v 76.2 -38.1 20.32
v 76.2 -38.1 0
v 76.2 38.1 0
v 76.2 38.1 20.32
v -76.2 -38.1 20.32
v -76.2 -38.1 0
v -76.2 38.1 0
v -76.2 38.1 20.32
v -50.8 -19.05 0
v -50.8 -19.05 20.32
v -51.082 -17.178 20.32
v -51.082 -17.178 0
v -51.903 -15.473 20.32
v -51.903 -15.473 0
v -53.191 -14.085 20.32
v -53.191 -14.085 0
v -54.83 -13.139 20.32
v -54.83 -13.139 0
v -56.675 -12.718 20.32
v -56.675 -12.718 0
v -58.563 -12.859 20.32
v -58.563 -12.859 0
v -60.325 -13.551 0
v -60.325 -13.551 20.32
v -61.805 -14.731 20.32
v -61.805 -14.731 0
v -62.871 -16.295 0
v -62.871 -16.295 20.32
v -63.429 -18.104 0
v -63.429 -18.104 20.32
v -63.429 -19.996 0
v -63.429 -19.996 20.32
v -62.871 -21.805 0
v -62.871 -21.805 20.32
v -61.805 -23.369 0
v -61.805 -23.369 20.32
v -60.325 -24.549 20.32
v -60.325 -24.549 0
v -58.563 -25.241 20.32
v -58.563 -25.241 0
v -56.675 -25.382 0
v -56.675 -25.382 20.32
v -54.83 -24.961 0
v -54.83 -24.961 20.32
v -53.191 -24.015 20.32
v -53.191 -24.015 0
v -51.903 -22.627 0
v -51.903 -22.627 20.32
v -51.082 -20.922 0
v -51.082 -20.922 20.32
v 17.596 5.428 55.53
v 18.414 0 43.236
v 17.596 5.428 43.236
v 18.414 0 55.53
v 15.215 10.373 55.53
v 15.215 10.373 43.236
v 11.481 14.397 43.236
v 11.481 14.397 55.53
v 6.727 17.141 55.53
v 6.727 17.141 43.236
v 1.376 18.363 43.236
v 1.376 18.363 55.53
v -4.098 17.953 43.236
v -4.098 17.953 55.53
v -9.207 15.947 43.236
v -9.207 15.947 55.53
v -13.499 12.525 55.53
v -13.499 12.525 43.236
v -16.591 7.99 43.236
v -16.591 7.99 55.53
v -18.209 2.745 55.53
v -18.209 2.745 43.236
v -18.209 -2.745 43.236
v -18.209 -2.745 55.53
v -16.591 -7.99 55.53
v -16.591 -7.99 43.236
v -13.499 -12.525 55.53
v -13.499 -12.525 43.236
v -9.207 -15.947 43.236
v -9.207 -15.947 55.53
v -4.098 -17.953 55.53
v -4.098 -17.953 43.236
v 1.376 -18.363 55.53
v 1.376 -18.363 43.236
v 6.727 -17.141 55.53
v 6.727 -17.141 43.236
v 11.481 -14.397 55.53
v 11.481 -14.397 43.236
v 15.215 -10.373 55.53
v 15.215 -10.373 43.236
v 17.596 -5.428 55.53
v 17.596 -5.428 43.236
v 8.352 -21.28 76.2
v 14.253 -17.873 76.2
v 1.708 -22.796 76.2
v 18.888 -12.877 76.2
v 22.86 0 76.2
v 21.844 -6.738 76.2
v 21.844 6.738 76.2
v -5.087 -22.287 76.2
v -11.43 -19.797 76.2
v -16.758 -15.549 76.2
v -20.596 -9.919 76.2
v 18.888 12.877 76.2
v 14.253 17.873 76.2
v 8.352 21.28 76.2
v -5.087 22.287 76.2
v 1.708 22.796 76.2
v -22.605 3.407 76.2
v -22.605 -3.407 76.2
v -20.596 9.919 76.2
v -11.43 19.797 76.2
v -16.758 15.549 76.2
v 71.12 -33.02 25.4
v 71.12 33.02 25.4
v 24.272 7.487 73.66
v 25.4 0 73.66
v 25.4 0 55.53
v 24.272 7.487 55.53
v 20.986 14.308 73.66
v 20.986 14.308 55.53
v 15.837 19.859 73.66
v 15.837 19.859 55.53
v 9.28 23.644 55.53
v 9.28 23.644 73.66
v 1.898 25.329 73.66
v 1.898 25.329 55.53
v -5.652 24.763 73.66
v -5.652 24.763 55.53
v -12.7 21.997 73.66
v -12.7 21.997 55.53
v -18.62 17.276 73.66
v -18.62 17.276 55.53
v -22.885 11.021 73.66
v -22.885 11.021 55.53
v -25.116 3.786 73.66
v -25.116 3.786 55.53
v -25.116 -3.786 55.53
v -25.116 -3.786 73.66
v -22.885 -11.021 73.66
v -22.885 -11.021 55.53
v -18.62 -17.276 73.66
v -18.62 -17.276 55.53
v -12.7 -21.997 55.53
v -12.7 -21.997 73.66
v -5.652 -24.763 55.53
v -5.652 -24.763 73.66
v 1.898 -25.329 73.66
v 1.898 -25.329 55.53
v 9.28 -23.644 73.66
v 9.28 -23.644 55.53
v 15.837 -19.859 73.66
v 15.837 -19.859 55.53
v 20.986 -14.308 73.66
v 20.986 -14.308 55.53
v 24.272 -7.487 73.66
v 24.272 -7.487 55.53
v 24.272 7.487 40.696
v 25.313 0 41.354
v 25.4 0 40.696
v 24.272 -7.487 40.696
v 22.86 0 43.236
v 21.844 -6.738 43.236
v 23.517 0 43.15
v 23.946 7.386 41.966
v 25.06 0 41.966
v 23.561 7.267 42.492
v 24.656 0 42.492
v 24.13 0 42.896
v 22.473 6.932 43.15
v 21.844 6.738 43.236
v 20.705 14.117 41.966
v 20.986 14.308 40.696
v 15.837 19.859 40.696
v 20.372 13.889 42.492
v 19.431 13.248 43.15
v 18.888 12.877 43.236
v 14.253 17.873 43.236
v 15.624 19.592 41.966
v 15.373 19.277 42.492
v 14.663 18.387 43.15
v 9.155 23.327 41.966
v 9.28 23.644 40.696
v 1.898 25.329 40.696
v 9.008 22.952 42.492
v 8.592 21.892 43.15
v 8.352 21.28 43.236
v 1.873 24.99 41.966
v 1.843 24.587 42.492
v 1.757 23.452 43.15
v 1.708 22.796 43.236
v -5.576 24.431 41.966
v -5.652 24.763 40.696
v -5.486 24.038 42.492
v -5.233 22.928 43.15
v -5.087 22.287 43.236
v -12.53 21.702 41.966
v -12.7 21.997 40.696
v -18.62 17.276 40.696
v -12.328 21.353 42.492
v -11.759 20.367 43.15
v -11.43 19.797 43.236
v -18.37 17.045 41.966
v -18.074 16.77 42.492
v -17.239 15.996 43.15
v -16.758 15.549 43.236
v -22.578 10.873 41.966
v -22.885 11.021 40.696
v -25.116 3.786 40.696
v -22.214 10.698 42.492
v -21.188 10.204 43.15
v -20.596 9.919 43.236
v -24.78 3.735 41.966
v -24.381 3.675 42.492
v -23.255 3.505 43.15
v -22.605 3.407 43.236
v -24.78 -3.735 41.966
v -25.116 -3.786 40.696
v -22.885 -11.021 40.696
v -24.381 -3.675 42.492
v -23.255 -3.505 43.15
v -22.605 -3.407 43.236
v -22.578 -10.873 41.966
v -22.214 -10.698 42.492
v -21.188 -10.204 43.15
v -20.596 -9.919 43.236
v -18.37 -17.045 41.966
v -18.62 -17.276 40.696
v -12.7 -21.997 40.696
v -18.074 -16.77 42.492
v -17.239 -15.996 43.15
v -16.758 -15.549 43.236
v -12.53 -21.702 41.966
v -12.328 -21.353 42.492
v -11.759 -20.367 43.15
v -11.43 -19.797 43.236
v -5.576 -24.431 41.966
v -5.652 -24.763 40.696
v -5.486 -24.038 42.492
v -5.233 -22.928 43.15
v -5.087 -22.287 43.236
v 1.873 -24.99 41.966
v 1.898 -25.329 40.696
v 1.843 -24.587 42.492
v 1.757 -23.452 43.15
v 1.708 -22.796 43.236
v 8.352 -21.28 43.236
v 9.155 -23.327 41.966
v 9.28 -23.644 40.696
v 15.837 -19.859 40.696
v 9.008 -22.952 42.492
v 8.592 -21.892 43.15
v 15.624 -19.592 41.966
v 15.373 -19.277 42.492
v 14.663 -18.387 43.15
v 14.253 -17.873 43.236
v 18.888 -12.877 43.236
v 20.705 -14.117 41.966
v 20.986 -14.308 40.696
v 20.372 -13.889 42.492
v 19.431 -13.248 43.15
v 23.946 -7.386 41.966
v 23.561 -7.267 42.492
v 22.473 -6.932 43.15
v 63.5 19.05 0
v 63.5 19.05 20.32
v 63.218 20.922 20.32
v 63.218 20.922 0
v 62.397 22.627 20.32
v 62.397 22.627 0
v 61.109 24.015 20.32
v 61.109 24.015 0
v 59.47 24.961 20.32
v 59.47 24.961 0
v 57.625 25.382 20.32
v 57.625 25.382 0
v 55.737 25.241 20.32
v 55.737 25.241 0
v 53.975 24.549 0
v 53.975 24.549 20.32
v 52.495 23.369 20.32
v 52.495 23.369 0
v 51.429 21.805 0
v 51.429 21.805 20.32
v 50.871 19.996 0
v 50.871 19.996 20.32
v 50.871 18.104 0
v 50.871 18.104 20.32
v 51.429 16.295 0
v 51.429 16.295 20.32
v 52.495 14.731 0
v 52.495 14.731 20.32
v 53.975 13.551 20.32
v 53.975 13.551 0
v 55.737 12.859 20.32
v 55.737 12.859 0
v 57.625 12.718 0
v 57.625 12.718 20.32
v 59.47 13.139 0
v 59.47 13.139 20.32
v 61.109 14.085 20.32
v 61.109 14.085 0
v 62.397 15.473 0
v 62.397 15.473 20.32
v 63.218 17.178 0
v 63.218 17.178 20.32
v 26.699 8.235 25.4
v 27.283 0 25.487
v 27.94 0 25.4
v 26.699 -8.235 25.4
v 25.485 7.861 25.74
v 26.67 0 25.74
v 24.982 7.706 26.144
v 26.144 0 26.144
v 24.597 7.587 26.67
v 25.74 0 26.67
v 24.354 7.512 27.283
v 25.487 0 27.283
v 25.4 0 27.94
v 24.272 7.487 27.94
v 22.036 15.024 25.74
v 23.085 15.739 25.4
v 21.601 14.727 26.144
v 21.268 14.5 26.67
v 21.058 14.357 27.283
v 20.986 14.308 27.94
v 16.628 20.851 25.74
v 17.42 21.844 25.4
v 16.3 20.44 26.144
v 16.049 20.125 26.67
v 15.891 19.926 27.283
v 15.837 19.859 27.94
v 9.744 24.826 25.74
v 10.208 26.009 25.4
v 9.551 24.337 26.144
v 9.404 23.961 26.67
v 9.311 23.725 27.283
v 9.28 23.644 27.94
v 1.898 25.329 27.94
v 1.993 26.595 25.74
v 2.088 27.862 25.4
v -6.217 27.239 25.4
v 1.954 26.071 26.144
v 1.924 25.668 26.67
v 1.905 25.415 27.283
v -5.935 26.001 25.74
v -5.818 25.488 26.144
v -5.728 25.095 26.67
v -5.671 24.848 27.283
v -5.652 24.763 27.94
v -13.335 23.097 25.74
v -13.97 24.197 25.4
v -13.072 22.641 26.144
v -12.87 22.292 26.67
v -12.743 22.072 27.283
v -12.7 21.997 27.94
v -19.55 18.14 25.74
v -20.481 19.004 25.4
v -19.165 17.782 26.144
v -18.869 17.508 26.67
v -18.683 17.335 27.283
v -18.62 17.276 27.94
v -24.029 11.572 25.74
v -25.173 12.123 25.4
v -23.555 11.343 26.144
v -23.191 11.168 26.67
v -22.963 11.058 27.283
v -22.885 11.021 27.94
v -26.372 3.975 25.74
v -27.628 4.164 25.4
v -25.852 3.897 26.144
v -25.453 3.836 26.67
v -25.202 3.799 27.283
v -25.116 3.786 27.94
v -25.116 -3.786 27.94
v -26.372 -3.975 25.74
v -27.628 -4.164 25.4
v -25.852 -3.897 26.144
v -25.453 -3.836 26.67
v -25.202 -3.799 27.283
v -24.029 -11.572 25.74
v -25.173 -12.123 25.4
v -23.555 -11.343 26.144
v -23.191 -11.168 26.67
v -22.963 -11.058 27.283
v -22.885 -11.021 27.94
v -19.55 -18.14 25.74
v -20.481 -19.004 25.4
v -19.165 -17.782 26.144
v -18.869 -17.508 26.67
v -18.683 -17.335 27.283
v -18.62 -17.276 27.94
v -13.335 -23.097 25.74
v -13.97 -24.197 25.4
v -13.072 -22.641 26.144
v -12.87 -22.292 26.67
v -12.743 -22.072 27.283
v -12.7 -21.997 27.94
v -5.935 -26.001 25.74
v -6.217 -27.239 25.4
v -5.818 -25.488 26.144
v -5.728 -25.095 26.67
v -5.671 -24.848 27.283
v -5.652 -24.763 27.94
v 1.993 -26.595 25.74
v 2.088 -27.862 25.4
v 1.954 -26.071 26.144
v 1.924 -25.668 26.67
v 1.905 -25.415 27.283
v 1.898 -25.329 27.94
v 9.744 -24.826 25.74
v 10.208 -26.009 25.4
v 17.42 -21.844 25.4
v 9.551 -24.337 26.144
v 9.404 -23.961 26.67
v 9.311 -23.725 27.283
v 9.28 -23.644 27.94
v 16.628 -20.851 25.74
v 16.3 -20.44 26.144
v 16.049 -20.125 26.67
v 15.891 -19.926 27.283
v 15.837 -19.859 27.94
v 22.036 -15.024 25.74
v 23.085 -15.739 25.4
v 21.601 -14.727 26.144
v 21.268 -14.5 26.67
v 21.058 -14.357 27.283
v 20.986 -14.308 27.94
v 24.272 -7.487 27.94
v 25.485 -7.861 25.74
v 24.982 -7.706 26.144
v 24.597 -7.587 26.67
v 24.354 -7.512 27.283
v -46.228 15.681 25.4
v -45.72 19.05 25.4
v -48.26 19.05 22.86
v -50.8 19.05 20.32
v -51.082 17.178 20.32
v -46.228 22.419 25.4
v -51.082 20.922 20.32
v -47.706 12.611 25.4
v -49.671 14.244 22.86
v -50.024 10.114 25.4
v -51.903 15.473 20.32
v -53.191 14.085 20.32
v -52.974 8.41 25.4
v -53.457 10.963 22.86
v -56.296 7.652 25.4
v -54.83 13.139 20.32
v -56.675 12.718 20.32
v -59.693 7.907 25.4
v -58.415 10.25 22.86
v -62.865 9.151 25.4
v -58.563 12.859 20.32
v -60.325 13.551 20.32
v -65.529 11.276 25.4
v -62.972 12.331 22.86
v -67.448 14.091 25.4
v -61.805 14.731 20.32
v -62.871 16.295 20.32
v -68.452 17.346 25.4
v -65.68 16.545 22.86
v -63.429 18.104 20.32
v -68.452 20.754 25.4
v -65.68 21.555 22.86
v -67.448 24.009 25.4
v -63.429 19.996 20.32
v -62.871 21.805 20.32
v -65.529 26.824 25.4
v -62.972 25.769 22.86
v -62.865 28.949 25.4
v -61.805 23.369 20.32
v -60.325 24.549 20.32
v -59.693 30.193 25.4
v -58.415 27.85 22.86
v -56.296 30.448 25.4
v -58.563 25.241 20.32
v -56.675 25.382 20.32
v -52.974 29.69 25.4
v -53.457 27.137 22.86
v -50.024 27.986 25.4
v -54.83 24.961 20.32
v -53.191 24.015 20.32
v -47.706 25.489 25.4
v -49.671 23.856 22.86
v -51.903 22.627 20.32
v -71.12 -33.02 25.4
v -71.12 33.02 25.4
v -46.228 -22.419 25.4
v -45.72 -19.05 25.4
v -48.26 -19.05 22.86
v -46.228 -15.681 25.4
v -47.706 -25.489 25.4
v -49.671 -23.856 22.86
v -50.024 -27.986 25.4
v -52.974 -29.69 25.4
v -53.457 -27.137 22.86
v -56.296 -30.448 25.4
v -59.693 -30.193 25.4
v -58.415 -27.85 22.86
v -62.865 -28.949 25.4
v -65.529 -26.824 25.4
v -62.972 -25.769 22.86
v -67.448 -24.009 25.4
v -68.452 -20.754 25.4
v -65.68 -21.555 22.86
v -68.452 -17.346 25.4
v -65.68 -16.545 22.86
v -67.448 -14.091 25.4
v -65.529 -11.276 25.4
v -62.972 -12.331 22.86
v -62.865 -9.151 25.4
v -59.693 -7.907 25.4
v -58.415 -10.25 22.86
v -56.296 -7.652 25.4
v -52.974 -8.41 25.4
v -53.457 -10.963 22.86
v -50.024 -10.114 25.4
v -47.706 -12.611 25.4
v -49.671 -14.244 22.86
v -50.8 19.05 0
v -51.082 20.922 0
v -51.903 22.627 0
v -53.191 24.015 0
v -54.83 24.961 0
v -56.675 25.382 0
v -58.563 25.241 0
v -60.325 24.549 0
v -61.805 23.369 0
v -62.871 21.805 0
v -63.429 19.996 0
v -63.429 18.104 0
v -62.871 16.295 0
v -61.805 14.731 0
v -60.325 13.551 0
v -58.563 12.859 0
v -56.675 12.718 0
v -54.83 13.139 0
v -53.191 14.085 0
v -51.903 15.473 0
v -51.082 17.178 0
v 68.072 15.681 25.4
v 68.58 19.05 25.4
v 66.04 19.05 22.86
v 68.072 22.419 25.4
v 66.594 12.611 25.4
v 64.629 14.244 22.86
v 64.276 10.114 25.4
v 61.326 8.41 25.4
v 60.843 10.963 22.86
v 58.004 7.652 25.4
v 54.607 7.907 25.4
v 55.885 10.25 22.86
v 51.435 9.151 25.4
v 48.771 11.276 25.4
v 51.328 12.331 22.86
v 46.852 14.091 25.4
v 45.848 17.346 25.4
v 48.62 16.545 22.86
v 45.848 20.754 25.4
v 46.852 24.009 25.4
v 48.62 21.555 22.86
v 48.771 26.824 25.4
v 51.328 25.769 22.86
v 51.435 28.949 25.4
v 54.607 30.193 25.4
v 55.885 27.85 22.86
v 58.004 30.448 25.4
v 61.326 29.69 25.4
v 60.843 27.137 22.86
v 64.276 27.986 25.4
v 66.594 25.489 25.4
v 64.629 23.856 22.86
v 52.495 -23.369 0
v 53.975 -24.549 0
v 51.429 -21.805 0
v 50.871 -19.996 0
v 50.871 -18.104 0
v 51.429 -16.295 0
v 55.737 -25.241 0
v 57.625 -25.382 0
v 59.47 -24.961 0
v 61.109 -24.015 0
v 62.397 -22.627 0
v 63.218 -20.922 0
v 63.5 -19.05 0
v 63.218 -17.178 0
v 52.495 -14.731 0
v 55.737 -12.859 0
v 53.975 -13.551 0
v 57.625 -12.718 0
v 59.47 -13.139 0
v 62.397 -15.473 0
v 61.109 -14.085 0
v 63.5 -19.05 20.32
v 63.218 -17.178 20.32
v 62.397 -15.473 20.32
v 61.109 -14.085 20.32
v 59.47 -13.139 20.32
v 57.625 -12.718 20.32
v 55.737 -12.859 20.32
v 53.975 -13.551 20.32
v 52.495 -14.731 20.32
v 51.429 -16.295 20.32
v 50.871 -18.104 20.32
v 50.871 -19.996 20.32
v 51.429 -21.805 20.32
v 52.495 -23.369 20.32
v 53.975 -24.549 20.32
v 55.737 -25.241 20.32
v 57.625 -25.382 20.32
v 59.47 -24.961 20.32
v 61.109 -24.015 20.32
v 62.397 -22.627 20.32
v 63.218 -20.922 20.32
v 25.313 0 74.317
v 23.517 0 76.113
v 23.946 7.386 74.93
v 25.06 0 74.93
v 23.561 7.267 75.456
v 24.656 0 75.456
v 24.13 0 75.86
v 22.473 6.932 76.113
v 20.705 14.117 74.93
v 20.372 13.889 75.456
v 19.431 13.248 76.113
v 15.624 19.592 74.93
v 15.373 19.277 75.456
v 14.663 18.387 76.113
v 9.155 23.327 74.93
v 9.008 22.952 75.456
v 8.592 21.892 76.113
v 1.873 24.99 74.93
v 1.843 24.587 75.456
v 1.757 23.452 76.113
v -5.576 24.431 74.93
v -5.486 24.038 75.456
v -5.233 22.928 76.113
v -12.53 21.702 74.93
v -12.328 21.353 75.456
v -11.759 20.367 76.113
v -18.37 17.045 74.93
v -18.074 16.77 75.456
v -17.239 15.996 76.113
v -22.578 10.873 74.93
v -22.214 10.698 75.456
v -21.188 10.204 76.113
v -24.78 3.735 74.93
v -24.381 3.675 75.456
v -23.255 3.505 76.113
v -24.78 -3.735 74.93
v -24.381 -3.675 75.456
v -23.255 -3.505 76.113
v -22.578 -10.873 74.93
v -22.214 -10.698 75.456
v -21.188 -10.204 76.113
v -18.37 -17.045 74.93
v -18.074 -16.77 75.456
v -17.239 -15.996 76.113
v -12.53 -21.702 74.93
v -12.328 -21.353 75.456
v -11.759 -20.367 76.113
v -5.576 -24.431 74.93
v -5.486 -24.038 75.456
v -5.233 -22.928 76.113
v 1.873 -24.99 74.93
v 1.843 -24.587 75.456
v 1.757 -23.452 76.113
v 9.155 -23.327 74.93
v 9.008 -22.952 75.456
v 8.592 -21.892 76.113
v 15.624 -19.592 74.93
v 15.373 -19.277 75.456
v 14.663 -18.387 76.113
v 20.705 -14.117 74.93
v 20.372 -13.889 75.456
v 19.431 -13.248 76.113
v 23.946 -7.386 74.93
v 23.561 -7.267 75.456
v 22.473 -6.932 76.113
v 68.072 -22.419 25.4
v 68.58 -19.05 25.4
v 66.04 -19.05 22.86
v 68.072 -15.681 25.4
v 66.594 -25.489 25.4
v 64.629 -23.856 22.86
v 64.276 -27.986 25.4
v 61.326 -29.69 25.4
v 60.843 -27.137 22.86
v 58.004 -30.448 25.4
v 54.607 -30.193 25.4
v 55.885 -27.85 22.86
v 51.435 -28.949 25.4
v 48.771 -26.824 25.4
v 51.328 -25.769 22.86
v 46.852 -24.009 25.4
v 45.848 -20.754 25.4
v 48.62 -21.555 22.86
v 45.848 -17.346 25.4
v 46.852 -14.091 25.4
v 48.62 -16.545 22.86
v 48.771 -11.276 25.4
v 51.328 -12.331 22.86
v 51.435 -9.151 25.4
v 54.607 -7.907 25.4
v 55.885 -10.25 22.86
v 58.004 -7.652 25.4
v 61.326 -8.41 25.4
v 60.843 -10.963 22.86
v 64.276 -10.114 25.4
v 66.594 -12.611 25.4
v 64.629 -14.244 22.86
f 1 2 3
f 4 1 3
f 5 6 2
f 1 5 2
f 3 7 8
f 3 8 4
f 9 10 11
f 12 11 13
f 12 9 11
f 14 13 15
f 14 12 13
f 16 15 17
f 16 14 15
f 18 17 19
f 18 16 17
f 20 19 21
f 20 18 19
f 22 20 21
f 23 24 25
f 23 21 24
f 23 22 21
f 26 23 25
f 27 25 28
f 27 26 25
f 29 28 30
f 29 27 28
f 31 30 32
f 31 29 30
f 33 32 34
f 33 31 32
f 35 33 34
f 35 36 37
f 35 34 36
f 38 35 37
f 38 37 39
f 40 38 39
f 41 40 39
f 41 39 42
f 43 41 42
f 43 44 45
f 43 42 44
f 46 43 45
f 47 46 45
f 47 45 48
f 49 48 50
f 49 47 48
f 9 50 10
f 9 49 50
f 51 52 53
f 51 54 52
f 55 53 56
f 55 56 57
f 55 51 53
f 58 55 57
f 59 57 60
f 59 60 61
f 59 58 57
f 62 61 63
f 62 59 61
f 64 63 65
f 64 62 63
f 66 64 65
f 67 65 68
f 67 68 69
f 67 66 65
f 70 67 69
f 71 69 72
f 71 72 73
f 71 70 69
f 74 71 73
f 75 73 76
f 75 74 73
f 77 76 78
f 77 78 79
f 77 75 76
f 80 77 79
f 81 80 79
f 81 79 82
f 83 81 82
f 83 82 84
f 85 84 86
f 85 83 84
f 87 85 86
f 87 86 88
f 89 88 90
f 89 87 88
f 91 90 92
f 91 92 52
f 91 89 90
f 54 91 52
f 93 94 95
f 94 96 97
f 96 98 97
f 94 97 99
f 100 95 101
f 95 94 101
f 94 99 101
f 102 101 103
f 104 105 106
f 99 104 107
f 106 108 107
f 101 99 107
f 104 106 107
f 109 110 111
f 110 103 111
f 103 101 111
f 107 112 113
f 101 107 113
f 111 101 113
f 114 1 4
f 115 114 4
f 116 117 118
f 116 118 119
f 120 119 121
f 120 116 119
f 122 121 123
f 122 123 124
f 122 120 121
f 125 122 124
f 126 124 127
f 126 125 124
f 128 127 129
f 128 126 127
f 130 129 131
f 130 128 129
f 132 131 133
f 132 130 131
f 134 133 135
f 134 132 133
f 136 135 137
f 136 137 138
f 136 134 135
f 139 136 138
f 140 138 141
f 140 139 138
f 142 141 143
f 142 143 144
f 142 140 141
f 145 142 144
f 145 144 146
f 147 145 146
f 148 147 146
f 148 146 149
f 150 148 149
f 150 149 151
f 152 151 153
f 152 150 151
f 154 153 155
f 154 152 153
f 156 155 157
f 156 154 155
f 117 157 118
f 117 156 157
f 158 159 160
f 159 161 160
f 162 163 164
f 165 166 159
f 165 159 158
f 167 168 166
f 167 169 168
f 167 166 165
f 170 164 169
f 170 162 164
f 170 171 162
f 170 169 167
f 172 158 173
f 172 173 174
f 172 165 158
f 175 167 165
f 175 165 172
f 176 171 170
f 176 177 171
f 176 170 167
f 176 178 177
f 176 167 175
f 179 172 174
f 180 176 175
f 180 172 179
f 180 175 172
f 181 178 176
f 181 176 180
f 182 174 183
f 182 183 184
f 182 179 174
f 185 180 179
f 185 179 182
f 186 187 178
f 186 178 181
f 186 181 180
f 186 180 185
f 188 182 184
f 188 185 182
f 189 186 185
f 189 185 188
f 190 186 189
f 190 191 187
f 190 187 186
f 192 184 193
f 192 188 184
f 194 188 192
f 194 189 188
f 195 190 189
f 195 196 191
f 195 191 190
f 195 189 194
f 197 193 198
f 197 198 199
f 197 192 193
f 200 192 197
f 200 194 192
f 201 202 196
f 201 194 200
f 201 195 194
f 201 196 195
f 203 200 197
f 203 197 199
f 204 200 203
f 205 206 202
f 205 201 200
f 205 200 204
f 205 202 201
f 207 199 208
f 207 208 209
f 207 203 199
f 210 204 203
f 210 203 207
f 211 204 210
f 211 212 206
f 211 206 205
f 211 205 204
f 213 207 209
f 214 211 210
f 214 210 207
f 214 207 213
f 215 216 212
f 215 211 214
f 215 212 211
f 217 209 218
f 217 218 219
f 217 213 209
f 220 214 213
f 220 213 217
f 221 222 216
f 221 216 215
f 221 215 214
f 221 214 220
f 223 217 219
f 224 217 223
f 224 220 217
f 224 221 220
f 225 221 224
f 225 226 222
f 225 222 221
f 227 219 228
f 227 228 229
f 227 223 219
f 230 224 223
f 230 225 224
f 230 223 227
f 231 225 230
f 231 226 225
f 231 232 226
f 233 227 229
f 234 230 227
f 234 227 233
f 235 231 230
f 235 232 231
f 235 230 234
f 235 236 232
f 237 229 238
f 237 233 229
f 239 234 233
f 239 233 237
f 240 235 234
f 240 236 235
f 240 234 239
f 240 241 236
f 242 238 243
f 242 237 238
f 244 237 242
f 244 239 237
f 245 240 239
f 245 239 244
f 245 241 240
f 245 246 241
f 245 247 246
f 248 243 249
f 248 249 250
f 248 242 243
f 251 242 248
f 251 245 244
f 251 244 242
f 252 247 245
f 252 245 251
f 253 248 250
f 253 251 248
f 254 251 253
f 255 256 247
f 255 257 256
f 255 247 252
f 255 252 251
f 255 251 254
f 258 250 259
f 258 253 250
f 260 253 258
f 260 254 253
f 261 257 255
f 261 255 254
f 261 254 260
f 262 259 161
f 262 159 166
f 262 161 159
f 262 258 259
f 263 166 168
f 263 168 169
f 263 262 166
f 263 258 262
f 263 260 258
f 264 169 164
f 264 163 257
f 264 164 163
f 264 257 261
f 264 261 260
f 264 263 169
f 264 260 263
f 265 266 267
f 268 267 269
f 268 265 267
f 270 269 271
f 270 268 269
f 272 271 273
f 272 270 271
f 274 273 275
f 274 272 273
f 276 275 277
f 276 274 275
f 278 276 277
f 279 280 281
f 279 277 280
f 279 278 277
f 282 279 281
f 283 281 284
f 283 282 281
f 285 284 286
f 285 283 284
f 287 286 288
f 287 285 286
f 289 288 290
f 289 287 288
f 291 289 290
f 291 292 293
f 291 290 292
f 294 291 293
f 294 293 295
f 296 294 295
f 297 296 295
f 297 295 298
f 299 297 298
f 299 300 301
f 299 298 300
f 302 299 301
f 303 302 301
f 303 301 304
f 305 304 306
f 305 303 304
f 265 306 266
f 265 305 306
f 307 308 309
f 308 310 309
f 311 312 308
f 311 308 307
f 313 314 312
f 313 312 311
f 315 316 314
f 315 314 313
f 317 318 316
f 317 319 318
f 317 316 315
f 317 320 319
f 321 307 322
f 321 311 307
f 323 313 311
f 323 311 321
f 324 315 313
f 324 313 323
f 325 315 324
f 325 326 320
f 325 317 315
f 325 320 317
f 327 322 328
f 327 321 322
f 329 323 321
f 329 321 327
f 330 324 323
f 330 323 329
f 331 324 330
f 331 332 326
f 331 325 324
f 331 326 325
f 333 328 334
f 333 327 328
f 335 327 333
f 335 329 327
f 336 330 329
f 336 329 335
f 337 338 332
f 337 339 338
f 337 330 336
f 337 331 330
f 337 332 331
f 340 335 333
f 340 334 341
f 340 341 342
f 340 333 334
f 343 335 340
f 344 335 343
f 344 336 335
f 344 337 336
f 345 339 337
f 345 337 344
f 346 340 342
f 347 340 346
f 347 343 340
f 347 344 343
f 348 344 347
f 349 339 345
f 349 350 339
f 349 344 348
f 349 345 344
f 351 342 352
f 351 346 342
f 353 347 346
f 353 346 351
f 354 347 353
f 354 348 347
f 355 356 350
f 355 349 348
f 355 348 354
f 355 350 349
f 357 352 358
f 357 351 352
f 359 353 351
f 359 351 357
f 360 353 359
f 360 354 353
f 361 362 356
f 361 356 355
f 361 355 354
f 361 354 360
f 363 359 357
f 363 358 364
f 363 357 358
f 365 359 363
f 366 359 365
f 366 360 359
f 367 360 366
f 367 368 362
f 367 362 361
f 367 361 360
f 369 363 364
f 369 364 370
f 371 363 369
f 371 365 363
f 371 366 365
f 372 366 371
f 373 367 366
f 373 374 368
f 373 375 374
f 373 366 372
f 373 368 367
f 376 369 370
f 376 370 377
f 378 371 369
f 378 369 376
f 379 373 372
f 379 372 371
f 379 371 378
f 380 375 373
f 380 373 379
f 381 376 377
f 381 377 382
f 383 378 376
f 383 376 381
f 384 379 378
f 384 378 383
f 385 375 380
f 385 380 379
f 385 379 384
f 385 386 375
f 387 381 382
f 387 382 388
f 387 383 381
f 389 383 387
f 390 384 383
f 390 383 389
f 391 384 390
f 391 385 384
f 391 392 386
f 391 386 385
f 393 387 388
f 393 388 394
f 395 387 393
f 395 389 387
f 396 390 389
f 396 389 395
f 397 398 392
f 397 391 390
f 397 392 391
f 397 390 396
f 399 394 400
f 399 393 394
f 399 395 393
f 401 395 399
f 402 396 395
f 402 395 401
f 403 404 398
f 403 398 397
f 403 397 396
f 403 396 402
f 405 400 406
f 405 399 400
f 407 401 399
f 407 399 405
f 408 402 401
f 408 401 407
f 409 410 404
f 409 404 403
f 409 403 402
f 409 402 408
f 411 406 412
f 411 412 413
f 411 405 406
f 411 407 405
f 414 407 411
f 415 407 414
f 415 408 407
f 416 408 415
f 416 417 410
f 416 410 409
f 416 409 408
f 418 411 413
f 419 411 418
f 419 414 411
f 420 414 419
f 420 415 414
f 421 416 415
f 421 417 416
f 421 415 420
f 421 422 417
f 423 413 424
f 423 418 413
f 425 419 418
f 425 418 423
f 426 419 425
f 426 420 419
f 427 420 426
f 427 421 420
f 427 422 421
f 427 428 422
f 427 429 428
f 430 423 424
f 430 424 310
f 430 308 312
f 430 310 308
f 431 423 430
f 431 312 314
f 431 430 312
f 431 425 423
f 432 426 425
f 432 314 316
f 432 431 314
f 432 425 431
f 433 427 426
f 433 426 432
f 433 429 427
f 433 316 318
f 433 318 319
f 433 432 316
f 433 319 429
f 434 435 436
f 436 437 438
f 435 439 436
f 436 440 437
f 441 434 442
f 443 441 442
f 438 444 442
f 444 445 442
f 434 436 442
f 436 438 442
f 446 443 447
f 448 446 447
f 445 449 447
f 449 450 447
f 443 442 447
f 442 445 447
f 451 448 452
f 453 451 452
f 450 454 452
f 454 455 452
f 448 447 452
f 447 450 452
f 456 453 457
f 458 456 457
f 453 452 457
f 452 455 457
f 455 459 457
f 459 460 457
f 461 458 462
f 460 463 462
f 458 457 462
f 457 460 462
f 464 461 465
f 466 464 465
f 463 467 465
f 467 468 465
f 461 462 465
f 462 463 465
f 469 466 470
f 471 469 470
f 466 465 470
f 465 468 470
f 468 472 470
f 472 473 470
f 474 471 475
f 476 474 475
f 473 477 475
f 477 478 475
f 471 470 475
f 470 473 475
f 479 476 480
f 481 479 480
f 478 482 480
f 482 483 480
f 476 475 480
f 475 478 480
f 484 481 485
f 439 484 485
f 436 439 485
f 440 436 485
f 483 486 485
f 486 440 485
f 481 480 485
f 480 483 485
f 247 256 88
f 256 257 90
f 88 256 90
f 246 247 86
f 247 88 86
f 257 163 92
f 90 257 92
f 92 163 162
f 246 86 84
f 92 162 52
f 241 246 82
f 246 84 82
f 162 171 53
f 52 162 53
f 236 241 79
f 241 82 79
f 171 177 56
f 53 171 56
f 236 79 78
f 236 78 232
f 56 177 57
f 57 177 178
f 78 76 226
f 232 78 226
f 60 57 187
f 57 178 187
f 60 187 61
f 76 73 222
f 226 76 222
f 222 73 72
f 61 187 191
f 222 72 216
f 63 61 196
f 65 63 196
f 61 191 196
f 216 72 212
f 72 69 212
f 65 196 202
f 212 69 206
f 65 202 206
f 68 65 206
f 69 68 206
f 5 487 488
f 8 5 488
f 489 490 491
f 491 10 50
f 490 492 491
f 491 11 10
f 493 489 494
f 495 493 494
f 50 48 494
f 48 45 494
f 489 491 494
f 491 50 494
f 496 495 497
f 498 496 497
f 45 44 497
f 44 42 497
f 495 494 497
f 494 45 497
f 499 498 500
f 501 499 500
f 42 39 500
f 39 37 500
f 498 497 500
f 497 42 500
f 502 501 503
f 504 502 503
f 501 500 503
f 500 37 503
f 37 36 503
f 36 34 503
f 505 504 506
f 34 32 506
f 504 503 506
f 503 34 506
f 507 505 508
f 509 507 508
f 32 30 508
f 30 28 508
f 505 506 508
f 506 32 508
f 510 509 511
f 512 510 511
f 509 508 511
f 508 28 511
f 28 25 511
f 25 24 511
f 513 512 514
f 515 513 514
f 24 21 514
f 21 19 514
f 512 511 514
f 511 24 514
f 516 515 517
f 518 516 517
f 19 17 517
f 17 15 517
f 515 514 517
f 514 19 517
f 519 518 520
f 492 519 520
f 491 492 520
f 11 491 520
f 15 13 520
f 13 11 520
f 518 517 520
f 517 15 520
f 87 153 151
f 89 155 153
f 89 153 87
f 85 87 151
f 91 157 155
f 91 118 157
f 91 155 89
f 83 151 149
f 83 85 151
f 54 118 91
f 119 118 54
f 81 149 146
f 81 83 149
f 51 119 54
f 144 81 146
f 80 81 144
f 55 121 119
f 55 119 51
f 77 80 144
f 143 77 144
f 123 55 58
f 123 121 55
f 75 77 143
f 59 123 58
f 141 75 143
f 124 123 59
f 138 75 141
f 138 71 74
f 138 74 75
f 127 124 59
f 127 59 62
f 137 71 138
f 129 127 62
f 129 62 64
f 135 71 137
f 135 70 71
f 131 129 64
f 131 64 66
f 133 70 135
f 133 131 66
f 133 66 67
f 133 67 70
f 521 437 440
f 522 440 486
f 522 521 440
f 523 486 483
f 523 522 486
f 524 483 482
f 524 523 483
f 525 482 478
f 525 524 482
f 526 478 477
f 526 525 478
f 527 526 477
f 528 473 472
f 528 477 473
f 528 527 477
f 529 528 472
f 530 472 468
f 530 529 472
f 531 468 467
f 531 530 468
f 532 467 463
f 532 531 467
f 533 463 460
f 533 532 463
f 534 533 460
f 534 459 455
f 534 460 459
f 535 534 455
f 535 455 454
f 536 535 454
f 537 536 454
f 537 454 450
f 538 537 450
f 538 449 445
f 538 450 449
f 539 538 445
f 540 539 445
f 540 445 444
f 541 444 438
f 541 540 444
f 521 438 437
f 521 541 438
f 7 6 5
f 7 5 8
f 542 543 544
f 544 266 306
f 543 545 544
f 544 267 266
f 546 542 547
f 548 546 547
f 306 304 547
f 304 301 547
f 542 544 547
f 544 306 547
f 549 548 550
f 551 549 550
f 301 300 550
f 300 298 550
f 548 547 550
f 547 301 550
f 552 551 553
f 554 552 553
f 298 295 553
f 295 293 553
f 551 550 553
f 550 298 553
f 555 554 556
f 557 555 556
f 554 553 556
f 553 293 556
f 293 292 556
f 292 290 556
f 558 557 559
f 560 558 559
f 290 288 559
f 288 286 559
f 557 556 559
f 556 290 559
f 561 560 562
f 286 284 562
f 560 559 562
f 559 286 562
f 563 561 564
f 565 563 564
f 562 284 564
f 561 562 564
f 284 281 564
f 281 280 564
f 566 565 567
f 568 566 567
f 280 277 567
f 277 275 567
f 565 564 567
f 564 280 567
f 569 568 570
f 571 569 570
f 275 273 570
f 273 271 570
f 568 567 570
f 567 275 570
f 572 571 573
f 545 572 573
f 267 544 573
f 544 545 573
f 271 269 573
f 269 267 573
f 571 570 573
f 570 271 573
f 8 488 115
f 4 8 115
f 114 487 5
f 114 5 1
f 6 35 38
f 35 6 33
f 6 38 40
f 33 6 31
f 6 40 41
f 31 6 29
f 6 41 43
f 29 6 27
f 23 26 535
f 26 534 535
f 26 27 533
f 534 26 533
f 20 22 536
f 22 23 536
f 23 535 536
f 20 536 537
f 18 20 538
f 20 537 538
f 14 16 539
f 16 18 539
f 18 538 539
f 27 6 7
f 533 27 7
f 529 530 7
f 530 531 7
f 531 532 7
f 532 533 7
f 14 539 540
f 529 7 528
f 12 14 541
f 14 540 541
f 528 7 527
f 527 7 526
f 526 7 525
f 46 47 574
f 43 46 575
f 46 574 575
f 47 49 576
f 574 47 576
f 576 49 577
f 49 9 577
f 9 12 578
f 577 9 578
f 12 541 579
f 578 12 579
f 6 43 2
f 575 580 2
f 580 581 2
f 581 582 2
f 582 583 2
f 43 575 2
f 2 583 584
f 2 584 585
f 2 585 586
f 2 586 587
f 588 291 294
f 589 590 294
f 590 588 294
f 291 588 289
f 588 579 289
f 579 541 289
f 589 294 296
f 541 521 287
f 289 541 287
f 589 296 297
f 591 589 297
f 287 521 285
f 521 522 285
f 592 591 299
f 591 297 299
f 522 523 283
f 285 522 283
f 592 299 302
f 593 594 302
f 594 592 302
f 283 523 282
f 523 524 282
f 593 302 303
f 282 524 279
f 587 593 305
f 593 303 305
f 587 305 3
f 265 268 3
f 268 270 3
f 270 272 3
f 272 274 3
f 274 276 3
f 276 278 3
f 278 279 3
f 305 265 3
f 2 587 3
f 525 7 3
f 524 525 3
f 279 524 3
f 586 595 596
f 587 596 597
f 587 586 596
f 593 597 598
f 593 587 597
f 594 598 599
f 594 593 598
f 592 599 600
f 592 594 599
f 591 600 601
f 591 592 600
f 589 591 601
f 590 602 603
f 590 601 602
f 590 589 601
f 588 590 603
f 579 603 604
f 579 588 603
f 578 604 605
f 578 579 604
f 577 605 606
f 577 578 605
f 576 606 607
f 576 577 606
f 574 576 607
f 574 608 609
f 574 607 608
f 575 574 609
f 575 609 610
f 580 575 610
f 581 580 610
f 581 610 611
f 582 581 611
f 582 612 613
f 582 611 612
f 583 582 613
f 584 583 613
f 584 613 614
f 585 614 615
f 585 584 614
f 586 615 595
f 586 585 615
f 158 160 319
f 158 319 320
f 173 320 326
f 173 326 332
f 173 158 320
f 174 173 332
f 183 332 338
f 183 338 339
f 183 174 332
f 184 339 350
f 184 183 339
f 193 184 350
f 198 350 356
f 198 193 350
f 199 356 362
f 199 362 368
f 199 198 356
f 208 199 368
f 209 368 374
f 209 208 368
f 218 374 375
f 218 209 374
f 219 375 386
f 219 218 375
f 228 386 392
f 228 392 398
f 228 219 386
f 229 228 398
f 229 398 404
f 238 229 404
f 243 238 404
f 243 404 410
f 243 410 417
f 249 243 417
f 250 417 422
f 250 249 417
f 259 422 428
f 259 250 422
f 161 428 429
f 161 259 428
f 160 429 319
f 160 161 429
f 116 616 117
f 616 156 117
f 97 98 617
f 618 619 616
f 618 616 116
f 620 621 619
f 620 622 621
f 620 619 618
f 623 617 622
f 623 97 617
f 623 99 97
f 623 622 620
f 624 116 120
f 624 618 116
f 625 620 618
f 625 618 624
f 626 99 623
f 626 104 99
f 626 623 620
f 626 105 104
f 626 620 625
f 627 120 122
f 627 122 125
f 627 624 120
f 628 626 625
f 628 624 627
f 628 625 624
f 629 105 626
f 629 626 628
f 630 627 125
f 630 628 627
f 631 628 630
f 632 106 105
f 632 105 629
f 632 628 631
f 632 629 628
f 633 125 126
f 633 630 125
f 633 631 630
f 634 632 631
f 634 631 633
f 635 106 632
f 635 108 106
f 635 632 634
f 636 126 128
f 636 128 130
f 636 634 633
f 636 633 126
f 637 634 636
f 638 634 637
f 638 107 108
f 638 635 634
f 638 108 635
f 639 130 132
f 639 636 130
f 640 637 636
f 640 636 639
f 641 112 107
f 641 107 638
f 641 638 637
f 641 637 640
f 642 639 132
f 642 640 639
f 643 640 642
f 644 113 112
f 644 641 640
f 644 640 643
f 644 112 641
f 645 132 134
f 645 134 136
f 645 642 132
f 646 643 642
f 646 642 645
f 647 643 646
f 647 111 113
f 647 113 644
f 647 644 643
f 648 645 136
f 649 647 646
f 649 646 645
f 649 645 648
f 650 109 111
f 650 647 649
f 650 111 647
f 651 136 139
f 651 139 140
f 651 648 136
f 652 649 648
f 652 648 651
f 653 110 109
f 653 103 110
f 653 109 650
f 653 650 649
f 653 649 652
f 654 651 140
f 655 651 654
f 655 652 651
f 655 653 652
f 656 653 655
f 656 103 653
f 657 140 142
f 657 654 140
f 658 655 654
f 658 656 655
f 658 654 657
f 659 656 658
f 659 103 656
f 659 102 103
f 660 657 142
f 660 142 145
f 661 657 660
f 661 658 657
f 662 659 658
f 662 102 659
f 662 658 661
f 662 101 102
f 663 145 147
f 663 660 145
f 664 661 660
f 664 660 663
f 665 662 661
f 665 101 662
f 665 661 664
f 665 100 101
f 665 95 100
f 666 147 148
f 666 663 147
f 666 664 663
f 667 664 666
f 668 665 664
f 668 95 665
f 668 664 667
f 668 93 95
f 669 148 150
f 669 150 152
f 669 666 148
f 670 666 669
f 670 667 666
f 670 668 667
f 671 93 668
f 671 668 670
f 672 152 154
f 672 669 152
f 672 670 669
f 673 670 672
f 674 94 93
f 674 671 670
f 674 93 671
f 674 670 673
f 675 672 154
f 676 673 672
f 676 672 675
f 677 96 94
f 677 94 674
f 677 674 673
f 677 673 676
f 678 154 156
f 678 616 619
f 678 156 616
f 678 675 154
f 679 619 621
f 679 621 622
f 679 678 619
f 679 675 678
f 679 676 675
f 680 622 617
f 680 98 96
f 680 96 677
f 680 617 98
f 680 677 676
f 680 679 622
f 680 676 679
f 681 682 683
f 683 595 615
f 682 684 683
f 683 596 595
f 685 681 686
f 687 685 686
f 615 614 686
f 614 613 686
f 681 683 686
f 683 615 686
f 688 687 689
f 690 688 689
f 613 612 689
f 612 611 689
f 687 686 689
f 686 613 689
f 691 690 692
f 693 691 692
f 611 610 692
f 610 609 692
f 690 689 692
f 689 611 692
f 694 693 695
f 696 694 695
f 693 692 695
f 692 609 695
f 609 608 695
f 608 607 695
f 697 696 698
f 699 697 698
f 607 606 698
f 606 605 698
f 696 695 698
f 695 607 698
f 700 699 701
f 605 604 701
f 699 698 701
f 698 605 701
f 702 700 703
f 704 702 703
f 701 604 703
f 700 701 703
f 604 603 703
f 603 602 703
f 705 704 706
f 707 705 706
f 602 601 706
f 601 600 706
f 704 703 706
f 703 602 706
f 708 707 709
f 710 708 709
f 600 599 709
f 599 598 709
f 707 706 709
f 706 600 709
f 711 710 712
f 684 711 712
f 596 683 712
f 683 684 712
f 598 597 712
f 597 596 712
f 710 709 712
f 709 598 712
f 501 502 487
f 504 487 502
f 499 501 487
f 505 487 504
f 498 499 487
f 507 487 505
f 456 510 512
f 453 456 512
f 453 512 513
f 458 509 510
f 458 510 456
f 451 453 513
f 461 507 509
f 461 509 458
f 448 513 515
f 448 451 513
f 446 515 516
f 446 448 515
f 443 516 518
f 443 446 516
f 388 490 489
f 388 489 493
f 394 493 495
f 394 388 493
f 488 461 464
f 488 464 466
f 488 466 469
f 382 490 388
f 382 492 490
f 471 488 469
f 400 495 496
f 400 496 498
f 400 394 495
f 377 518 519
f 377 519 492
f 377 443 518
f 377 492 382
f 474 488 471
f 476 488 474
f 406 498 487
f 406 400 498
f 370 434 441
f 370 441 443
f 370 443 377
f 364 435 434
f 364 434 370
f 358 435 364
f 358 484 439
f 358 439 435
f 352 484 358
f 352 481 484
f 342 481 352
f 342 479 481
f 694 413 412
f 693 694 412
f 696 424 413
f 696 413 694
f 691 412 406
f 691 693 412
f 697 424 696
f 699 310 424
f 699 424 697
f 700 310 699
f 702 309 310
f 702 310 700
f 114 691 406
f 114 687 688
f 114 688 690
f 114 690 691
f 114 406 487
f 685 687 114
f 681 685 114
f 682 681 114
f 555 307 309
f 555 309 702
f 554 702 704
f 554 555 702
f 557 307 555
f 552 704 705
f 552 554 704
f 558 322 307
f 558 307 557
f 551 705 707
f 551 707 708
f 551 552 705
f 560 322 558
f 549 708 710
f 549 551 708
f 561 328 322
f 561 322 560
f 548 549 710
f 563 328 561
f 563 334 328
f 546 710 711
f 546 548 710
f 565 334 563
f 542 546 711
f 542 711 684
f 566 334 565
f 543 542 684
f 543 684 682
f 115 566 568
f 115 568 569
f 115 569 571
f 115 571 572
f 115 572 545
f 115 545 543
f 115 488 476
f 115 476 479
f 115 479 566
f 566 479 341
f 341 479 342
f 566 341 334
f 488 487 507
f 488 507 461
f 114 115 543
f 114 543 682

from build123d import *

# Parameters (mm, degrees)
F0_W     = 152.4
F0_H     = 76.2
F1_DEPTH = 25.4
F2_R     = 6.35
F3_DEPTH = 25.401
F4_SIZE  = 5.08
F5_W     = 25.4
F5_H     = 50.8
F7_W     = 10.3809926659
F7_H     = 12.2932828963
F9_R     = 2.54
F10_R    = 2.54


with BuildPart() as f1:
    # F0 (on Top) → F1 (new body)
    with BuildSketch(Plane.XY):
        Rectangle(F0_W, F0_H)
    extrude(amount=F1_DEPTH)

    # F2 (on Top) → F3 (cut, through all)
    with BuildSketch(Plane.XY):
        with Locations((-57.15, 19.05)):
            Circle(F2_R)
        with Locations((-57.15, -19.05)):
            Circle(F2_R)
        with Locations((57.15, -19.05)):
            Circle(F2_R)
        with Locations((57.15, 19.05)):
            Circle(F2_R)
    extrude(amount=F3_DEPTH, mode=Mode.SUBTRACT)

    # F4
    f4_edges = [f1.edges().sort_by_distance(p)[0] for p in [
        (0, 38.1, 25.4),
        (76.2, 0, 25.4),
        (-76.2, 0, 25.4),
        (0, -38.1, 25.4),
        (-63.5, -19.05, 25.4),
        (50.8, -19.05, 25.4),
        (-63.5, 19.05, 25.4),
        (50.8, 19.05, 25.4),
    ]]
    chamfer(f4_edges, length=F4_SIZE)

    # F5 (on Front) → F6 (revolve)
    with BuildSketch(Plane.XZ):
        with Locations((12.7, 50.8)):
            Rectangle(F5_W, F5_H)
    revolve(axis=Axis((0, 0, 50.8), (0, 0, 1)))

    # F7 (on Front) → F8 (revolve, cut)
    with BuildSketch(Plane.XZ):
        with Locations((23.6047832295, 49.3830461055)):
            Rectangle(F7_W, F7_H)
    revolve(axis=Axis((0, 0, 25.4), (0, 0, 1)), mode=Mode.SUBTRACT)

    # F9
    f9_edges = [f1.edges().sort_by_distance(p)[0] for p in [
        (25.4, 0, 34.318202),
        (-25.4, 0, 43.236405),
        (-25.4, 0, 25.4),
    ]]
    fillet(f9_edges, radius=F9_R)

    # F10
    f10_edges = [f1.edges().sort_by_distance(p)[0] for p in [
        (-25.4, 0, 76.2),
    ]]
    fillet(f10_edges, radius=F10_R)


solid = f1.part
